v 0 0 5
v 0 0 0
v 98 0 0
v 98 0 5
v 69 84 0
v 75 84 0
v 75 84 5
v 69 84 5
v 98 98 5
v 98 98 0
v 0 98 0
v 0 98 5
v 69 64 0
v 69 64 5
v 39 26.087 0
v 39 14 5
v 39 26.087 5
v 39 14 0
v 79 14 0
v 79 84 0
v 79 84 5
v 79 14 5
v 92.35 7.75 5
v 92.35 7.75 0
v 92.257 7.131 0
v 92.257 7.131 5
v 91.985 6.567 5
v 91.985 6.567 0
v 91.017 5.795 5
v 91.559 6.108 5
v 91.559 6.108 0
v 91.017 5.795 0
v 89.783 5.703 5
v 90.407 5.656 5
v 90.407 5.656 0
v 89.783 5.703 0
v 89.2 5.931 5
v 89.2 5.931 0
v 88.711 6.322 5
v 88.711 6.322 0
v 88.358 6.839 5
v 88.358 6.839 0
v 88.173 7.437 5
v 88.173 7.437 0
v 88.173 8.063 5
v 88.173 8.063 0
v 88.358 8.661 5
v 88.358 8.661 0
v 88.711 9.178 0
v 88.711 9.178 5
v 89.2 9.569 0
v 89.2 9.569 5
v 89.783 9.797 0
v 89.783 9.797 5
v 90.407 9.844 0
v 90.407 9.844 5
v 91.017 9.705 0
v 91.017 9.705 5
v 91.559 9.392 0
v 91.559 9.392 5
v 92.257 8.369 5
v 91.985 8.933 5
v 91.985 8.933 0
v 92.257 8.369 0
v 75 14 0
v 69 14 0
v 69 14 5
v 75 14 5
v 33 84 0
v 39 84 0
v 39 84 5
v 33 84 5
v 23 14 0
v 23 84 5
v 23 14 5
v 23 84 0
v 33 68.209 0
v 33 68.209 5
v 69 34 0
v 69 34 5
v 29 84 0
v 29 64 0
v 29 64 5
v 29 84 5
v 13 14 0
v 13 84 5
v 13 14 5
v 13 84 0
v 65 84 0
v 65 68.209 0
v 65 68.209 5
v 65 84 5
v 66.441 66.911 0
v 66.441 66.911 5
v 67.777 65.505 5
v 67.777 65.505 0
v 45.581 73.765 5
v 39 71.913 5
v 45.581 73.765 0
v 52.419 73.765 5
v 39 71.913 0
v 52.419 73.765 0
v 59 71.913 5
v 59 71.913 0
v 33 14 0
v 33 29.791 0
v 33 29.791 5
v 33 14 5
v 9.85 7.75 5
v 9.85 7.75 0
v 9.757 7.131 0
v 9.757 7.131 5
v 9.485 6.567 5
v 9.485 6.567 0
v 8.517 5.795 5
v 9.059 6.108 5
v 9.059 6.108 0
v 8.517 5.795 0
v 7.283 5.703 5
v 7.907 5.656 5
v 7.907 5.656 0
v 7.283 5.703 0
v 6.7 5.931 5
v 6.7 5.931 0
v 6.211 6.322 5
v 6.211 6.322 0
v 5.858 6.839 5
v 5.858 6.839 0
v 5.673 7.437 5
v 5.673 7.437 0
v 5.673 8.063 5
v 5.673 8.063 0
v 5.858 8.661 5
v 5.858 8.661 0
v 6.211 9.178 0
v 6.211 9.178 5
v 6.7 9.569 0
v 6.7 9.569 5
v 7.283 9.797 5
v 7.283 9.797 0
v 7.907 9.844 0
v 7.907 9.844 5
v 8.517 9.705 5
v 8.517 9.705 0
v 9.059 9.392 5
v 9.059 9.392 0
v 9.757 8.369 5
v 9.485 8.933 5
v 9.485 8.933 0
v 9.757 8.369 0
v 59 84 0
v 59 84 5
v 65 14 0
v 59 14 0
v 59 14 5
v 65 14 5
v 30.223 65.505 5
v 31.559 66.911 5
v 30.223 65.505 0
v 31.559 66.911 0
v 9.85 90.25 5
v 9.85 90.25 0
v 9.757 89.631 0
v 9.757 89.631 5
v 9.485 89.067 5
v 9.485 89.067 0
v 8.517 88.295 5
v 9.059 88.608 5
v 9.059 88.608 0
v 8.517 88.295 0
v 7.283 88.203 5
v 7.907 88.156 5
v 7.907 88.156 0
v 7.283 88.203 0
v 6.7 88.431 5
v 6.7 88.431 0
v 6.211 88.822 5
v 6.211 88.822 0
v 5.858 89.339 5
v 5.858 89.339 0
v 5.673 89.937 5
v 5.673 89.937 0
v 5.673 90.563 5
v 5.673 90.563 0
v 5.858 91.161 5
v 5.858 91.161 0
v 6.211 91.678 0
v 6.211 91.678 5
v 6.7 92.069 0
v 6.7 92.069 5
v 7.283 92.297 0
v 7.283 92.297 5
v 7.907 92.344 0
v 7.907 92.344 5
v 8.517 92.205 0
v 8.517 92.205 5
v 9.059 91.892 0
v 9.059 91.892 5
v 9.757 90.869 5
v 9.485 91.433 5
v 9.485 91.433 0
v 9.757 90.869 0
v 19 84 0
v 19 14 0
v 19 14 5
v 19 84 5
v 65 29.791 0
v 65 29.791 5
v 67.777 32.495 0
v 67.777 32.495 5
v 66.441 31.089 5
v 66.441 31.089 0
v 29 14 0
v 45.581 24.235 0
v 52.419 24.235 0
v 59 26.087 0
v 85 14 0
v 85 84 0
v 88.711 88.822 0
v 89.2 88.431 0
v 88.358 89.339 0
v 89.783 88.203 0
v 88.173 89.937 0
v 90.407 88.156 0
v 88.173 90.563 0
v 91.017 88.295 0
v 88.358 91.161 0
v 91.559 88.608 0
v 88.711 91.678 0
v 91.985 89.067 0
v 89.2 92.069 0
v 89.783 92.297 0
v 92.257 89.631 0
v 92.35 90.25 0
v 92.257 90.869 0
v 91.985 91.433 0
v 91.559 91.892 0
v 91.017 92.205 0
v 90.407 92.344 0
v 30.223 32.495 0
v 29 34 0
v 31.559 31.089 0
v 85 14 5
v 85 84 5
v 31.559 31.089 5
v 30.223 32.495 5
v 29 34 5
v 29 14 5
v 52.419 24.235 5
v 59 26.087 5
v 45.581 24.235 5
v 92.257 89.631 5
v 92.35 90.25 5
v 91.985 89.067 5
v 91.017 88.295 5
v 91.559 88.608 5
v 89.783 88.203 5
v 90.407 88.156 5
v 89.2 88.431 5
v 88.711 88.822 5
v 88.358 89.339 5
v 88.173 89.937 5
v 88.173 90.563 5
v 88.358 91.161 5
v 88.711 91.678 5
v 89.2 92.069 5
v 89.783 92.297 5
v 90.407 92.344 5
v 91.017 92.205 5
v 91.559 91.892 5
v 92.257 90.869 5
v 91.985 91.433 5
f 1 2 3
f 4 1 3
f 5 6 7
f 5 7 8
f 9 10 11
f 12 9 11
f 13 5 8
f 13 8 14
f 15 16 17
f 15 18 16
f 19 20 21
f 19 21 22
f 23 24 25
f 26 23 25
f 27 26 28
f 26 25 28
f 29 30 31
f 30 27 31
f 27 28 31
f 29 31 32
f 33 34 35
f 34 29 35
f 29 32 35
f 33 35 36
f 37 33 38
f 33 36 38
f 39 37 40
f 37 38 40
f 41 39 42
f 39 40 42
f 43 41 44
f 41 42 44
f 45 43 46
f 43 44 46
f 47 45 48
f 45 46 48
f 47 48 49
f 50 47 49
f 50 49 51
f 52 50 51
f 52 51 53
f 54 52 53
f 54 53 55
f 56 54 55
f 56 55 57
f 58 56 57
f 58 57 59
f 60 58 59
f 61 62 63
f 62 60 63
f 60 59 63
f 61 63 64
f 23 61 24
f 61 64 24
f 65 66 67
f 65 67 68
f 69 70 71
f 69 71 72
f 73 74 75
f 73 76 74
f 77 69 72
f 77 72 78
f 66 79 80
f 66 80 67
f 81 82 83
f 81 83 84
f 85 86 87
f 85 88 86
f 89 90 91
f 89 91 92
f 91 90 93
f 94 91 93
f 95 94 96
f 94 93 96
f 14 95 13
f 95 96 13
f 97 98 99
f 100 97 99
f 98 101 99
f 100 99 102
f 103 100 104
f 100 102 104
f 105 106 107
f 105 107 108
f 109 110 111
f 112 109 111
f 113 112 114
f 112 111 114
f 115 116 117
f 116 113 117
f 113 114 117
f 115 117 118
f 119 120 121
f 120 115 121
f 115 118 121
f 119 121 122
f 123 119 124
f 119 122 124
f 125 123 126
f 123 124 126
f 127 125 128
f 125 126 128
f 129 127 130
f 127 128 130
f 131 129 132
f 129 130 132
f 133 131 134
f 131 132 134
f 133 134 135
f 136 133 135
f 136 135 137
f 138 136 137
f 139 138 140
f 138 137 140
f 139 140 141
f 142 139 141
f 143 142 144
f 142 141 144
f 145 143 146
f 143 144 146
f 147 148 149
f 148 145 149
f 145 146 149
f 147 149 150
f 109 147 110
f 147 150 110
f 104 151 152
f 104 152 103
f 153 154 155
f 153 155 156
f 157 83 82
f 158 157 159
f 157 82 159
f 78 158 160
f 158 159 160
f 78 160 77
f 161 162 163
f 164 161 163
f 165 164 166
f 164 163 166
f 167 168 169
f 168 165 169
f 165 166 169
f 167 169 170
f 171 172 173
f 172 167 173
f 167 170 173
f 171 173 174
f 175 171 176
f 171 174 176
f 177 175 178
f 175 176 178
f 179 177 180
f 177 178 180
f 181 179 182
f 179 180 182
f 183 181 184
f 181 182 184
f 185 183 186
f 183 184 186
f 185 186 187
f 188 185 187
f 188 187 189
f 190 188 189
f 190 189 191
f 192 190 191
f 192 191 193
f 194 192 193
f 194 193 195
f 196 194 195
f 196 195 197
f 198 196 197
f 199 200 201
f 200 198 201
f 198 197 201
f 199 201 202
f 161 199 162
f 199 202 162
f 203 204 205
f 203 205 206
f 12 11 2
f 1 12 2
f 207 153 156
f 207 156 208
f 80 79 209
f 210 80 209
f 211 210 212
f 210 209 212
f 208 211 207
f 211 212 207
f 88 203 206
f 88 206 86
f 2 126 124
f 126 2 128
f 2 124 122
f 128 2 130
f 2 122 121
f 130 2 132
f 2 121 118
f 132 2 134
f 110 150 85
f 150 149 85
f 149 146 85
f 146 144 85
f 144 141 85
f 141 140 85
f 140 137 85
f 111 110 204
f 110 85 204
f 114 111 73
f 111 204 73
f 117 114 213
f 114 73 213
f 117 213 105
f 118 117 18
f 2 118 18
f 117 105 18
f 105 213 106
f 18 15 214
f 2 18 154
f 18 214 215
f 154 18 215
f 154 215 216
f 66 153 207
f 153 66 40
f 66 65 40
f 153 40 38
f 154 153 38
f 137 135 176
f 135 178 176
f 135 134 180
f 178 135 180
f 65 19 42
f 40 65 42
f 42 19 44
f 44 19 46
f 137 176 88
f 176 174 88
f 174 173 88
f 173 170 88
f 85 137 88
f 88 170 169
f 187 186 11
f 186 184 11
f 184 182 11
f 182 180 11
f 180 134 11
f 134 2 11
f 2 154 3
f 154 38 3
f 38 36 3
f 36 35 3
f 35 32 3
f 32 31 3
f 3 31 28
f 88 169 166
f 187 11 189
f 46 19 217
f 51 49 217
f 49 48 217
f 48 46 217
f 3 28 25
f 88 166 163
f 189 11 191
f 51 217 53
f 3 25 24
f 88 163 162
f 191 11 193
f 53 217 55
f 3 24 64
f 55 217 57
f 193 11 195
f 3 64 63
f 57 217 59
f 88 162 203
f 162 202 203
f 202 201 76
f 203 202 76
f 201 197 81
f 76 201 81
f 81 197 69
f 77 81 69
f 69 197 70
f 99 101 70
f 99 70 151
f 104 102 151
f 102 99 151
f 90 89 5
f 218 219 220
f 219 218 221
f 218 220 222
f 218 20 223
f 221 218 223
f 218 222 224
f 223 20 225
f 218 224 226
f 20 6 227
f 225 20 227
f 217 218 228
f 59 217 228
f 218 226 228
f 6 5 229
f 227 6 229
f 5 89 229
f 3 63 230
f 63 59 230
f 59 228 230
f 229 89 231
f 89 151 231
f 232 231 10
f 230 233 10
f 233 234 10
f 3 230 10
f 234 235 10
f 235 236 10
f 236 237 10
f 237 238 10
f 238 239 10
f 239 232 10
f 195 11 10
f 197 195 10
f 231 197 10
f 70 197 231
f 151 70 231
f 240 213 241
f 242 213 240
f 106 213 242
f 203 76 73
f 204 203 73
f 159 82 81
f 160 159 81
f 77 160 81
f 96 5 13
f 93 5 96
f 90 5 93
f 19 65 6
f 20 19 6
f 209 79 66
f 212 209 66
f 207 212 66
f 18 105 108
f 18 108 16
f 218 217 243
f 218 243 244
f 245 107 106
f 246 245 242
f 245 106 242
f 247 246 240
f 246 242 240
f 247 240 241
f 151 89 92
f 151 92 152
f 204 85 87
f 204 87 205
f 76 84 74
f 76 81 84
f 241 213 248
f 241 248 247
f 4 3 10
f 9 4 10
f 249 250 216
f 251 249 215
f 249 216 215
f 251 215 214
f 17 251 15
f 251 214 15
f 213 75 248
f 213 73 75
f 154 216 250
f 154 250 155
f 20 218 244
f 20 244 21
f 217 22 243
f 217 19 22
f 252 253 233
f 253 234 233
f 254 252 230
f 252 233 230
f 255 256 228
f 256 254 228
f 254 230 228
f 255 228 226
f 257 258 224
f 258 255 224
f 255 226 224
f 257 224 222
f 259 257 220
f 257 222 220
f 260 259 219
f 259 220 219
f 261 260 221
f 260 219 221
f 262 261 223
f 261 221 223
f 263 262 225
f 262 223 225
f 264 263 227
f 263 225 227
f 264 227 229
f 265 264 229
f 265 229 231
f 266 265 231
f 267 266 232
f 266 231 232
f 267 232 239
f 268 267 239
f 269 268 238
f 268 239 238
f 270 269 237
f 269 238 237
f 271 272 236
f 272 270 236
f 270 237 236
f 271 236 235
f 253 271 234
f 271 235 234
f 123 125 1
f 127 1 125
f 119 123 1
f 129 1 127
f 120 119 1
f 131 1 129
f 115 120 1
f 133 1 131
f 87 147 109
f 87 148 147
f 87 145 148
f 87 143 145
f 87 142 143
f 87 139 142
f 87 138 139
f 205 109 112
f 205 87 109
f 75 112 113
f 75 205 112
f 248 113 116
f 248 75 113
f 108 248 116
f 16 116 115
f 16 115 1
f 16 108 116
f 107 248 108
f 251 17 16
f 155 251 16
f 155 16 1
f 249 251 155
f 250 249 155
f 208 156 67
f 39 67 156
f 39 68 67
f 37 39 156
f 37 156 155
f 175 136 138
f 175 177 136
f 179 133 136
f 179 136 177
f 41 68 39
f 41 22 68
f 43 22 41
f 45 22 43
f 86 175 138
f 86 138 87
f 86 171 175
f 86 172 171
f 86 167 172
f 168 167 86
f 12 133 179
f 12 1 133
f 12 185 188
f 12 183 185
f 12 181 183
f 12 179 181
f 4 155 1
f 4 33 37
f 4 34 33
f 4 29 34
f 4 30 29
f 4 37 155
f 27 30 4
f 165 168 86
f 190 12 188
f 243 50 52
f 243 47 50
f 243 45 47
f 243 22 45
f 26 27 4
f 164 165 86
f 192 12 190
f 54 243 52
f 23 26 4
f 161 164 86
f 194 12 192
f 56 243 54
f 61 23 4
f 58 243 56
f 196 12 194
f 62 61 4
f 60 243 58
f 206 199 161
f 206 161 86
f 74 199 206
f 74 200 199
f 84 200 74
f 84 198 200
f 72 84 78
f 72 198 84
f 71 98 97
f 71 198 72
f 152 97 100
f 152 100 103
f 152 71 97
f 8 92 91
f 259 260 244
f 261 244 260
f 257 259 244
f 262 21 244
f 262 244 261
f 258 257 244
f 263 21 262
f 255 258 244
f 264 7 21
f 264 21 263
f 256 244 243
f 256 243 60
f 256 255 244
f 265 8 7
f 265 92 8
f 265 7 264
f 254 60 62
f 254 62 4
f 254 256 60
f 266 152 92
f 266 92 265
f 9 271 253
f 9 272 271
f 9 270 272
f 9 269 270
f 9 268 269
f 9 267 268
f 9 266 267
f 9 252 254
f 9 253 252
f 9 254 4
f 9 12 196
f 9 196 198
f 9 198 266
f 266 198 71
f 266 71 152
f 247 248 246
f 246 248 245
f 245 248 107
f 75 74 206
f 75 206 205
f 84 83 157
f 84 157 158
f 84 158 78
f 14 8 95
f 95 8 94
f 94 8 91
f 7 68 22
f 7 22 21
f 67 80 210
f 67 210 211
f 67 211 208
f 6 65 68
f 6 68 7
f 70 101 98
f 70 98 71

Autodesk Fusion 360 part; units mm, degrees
sketch "Sketch1" plane through (0, 0, 0) normal (0, 0, 1) x (1, 0, 0)
  line L0 (0, 0) -> (98, 0)
  line L1 (98, 0) -> (98, 98)
  line L2 (98, 98) -> (0, 98)
  line L3 (0, 98) -> (0, 0)
extrude "Extrude1" add sketch "Sketch1" along normal blind 5
sketch "Sketch2" plane through (0, 0, 0) normal (0, 0, 1) x (1, 0, 0)
  circle A0 centre (7.75, 7.75) radius 2.1
extrude "Extrude2" cut sketch "Sketch2" along normal blind 5
sketch "Sketch3" plane through (0, 0, 0) normal (0, 0, 1) x (1, 0, 0)
  circle A0 centre (7.75, 90.25) radius 2.1
extrude "Extrude3" cut sketch "Sketch3" along normal blind 5
sketch "Sketch4" plane through (0, 0, 0) normal (0, 0, 1) x (1, 0, 0)
  circle A0 centre (90.25, 7.75) radius 2.1
extrude "Extrude4" cut sketch "Sketch4" along normal blind 5
sketch "Sketch5" plane through (0, 0, 0) normal (0, 0, 1) x (1, 0, 0)
  circle A0 centre (90.25, 90.25) radius 2.1
extrude "Extrude5" cut sketch "Sketch5" along normal blind 5
sketch "Sketch6" plane through (0, 0, 0) normal (0, 0, 1) x (1, 0, 0)
  circle A0 centre (49, 49) radius 25
extrude "Extrude6" cut sketch "Sketch6" along normal blind 5
sketch "Sketch7" plane through (0, 0, 0) normal (0, 0, 1) x (1, 0, 0)
  line L0 (13, 14) -> (19, 14)
  line L1 (19, 14) -> (19, 84)
  line L2 (19, 84) -> (13, 84)
  line L3 (13, 84) -> (13, 14)
extrude "Extrude7" cut sketch "Sketch7" along normal blind 5
sketch "Sketch8" plane through (0, 0, 0) normal (0, 0, 1) x (1, 0, 0)
  line L0 (23, 14) -> (29, 14)
  line L1 (29, 14) -> (29, 84)
  line L2 (29, 84) -> (23, 84)
  line L3 (23, 84) -> (23, 14)
extrude "Extrude8" cut sketch "Sketch8" along normal blind 5
sketch "Sketch9" plane through (0, 0, 0) normal (0, 0, 1) x (1, 0, 0)
  line L0 (33, 14) -> (39, 14)
  line L1 (39, 14) -> (39, 84)
  line L2 (39, 84) -> (33, 84)
  line L3 (33, 84) -> (33, 14)
extrude "Extrude9" cut sketch "Sketch9" along normal blind 5
sketch "Sketch10" plane through (0, 0, 0) normal (0, 0, 1) x (1, 0, 0)
  line L0 (59, 14) -> (65, 14)
  line L1 (65, 14) -> (65, 84)
  line L2 (65, 84) -> (59, 84)
  line L3 (59, 84) -> (59, 14)
extrude "Extrude10" cut sketch "Sketch10" along normal blind 5
sketch "Sketch11" plane through (0, 0, 0) normal (0, 0, 1) x (1, 0, 0)
  line L0 (69, 14) -> (75, 14)
  line L1 (75, 14) -> (75, 84)
  line L2 (75, 84) -> (69, 84)
  line L3 (69, 84) -> (69, 14)
extrude "Extrude11" cut sketch "Sketch11" along normal blind 5
sketch "Sketch12" plane through (0, 0, 0) normal (0, 0, 1) x (1, 0, 0)
  line L0 (79, 14) -> (85, 14)
  line L1 (85, 14) -> (85, 84)
  line L2 (85, 84) -> (79, 84)
  line L3 (79, 84) -> (79, 14)
extrude "Extrude12" cut sketch "Sketch12" along normal blind 5
